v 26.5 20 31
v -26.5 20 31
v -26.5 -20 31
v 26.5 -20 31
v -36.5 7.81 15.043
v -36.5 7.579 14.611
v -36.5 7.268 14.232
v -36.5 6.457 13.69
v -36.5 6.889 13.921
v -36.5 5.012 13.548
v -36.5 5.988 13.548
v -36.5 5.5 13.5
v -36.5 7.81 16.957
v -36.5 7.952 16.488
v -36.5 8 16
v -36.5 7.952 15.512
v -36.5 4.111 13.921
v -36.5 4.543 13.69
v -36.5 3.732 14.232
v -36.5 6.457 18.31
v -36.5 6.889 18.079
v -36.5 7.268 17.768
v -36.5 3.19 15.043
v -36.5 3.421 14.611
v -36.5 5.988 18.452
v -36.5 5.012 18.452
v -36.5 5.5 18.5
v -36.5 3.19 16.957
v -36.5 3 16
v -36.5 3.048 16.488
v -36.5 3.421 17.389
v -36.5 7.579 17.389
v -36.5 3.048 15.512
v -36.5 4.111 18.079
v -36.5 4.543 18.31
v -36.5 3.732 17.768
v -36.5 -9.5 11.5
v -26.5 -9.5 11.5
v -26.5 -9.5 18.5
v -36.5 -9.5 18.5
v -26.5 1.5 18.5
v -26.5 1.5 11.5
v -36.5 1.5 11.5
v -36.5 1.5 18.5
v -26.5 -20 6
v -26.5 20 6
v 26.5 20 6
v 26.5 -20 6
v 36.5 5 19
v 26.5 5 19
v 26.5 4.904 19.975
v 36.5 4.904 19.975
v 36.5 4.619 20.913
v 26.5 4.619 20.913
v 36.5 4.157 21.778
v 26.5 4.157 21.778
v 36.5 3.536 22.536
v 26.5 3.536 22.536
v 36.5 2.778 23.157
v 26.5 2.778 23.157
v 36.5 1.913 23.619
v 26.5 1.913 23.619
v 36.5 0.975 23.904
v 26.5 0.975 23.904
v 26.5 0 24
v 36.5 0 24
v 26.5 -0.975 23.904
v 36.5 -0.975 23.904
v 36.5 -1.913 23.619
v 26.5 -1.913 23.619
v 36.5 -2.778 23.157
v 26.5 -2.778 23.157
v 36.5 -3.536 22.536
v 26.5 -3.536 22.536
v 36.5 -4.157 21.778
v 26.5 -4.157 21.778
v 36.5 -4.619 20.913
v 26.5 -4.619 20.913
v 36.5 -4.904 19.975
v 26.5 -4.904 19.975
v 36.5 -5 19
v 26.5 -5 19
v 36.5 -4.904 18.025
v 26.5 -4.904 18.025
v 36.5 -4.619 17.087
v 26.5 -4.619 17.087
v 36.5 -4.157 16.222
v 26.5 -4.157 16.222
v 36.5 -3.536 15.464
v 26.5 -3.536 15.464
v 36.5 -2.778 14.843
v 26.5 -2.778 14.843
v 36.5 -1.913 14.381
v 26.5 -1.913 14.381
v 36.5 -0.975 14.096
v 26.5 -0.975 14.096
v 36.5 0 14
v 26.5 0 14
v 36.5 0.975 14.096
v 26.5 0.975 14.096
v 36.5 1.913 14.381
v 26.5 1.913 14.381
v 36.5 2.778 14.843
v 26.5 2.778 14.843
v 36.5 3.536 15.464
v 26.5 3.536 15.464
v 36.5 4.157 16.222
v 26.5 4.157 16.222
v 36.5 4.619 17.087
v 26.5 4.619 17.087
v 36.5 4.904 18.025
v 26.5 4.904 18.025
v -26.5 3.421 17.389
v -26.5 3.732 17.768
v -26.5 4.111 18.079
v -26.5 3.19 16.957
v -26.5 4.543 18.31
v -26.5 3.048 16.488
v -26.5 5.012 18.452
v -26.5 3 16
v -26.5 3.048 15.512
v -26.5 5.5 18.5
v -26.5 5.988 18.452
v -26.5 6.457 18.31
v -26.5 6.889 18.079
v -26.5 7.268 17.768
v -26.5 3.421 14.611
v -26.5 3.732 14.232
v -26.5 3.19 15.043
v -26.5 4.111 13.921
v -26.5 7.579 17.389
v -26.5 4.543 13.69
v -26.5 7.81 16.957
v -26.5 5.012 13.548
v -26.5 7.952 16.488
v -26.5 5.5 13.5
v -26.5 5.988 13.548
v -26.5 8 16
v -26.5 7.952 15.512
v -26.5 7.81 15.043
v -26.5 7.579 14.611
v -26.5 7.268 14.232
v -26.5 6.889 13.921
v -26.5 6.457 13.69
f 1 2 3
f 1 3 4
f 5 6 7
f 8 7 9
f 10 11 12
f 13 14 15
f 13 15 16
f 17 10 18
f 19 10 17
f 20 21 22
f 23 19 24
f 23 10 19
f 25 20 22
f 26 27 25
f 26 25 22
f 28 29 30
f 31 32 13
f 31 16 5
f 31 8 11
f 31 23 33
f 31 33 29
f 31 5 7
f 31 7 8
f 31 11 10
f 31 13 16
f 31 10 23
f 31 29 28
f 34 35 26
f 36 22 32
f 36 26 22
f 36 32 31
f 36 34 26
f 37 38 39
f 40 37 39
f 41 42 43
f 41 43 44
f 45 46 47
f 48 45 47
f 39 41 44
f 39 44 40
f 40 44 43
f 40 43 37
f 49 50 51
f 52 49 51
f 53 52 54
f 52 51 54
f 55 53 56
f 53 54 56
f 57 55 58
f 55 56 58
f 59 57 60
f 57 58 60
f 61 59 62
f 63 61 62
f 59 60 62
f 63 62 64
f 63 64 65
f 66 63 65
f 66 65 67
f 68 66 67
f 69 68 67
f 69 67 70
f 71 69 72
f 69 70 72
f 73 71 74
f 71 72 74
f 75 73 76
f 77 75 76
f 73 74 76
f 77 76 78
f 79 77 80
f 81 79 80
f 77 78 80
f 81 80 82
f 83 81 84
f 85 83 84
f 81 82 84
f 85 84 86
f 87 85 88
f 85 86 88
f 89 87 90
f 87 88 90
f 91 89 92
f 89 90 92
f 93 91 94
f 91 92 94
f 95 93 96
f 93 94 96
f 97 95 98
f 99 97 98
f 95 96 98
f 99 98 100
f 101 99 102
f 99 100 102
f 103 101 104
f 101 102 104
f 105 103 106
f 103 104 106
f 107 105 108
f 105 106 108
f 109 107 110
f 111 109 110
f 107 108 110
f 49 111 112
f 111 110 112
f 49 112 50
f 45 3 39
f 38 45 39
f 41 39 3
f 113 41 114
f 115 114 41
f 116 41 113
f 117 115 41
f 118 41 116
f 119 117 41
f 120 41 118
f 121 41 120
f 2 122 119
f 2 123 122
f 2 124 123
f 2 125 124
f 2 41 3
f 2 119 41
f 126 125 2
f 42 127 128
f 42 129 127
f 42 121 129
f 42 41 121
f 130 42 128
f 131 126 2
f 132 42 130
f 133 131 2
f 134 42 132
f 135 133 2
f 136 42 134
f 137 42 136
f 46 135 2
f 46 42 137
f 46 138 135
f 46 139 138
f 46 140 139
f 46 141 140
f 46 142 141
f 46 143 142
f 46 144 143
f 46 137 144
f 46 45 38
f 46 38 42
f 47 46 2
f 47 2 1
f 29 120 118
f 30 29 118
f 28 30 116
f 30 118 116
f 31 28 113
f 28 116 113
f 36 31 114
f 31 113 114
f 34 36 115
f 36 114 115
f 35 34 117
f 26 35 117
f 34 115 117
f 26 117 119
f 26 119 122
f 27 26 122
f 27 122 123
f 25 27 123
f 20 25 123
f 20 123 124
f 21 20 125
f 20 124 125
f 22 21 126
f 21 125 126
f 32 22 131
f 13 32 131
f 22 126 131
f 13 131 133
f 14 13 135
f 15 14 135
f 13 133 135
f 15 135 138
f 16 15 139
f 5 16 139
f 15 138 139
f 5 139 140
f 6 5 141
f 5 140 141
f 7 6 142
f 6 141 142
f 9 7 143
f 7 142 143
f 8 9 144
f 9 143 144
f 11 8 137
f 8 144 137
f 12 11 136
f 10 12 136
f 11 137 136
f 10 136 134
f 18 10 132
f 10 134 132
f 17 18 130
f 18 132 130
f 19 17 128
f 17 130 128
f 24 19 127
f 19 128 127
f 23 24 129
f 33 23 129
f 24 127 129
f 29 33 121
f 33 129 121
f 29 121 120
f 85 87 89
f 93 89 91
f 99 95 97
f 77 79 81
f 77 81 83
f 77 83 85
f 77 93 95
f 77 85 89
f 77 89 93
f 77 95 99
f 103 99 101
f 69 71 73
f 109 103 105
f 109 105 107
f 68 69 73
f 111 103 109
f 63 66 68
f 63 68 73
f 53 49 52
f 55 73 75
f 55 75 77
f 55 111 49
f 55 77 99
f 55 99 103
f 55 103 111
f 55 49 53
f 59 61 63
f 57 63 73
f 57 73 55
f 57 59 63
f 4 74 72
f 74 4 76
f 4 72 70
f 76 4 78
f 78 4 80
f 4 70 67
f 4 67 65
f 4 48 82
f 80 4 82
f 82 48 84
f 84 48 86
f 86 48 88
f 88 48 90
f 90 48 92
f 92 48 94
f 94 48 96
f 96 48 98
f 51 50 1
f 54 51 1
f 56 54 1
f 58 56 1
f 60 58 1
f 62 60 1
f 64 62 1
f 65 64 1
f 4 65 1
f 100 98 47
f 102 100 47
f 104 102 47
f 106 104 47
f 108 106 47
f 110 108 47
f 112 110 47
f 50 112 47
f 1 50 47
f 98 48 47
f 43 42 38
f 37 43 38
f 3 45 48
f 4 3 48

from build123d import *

# Parameters (mm, degrees)
SKETCH001_W  = 53
SKETCH001_H  = 40
PAD001_DEPTH = 25
SKETCH002_R  = 5
PAD002_DEPTH = 10
SKETCH003_R  = 2.5
SKETCH003_W  = 11
SKETCH003_H  = 7
PAD003_DEPTH = 10


with BuildPart() as part:
    # Sketch001 → Pad001 (new body)
    with BuildSketch(Plane.XY):
        Rectangle(SKETCH001_W, SKETCH001_H)
    extrude(amount=PAD001_DEPTH)

    # Sketch002 (on Face2 of Pad001) → Pad002 (join)
    with BuildSketch(Plane.YZ.offset(26.5)):
        with Locations((0, 13)):
            Circle(SKETCH002_R)
    extrude(amount=PAD002_DEPTH)

    # Sketch003 (on Face2 of Pad002) → Pad003 (join)
    with BuildSketch(Plane(origin=(-26.5, 0, 0), x_dir=(0, -1, 0), z_dir=(-1, 0, 0))):
        with Locations((-5.5, 10)):
            Circle(SKETCH003_R)
        with Locations((4, 9)):
            Rectangle(SKETCH003_W, SKETCH003_H)
    extrude(amount=PAD003_DEPTH)


with BuildPart() as part_1:
    # Body001 placement: moved
    add(part.part.moved(Location((0, 0, 6))))


solid = part_1.part
